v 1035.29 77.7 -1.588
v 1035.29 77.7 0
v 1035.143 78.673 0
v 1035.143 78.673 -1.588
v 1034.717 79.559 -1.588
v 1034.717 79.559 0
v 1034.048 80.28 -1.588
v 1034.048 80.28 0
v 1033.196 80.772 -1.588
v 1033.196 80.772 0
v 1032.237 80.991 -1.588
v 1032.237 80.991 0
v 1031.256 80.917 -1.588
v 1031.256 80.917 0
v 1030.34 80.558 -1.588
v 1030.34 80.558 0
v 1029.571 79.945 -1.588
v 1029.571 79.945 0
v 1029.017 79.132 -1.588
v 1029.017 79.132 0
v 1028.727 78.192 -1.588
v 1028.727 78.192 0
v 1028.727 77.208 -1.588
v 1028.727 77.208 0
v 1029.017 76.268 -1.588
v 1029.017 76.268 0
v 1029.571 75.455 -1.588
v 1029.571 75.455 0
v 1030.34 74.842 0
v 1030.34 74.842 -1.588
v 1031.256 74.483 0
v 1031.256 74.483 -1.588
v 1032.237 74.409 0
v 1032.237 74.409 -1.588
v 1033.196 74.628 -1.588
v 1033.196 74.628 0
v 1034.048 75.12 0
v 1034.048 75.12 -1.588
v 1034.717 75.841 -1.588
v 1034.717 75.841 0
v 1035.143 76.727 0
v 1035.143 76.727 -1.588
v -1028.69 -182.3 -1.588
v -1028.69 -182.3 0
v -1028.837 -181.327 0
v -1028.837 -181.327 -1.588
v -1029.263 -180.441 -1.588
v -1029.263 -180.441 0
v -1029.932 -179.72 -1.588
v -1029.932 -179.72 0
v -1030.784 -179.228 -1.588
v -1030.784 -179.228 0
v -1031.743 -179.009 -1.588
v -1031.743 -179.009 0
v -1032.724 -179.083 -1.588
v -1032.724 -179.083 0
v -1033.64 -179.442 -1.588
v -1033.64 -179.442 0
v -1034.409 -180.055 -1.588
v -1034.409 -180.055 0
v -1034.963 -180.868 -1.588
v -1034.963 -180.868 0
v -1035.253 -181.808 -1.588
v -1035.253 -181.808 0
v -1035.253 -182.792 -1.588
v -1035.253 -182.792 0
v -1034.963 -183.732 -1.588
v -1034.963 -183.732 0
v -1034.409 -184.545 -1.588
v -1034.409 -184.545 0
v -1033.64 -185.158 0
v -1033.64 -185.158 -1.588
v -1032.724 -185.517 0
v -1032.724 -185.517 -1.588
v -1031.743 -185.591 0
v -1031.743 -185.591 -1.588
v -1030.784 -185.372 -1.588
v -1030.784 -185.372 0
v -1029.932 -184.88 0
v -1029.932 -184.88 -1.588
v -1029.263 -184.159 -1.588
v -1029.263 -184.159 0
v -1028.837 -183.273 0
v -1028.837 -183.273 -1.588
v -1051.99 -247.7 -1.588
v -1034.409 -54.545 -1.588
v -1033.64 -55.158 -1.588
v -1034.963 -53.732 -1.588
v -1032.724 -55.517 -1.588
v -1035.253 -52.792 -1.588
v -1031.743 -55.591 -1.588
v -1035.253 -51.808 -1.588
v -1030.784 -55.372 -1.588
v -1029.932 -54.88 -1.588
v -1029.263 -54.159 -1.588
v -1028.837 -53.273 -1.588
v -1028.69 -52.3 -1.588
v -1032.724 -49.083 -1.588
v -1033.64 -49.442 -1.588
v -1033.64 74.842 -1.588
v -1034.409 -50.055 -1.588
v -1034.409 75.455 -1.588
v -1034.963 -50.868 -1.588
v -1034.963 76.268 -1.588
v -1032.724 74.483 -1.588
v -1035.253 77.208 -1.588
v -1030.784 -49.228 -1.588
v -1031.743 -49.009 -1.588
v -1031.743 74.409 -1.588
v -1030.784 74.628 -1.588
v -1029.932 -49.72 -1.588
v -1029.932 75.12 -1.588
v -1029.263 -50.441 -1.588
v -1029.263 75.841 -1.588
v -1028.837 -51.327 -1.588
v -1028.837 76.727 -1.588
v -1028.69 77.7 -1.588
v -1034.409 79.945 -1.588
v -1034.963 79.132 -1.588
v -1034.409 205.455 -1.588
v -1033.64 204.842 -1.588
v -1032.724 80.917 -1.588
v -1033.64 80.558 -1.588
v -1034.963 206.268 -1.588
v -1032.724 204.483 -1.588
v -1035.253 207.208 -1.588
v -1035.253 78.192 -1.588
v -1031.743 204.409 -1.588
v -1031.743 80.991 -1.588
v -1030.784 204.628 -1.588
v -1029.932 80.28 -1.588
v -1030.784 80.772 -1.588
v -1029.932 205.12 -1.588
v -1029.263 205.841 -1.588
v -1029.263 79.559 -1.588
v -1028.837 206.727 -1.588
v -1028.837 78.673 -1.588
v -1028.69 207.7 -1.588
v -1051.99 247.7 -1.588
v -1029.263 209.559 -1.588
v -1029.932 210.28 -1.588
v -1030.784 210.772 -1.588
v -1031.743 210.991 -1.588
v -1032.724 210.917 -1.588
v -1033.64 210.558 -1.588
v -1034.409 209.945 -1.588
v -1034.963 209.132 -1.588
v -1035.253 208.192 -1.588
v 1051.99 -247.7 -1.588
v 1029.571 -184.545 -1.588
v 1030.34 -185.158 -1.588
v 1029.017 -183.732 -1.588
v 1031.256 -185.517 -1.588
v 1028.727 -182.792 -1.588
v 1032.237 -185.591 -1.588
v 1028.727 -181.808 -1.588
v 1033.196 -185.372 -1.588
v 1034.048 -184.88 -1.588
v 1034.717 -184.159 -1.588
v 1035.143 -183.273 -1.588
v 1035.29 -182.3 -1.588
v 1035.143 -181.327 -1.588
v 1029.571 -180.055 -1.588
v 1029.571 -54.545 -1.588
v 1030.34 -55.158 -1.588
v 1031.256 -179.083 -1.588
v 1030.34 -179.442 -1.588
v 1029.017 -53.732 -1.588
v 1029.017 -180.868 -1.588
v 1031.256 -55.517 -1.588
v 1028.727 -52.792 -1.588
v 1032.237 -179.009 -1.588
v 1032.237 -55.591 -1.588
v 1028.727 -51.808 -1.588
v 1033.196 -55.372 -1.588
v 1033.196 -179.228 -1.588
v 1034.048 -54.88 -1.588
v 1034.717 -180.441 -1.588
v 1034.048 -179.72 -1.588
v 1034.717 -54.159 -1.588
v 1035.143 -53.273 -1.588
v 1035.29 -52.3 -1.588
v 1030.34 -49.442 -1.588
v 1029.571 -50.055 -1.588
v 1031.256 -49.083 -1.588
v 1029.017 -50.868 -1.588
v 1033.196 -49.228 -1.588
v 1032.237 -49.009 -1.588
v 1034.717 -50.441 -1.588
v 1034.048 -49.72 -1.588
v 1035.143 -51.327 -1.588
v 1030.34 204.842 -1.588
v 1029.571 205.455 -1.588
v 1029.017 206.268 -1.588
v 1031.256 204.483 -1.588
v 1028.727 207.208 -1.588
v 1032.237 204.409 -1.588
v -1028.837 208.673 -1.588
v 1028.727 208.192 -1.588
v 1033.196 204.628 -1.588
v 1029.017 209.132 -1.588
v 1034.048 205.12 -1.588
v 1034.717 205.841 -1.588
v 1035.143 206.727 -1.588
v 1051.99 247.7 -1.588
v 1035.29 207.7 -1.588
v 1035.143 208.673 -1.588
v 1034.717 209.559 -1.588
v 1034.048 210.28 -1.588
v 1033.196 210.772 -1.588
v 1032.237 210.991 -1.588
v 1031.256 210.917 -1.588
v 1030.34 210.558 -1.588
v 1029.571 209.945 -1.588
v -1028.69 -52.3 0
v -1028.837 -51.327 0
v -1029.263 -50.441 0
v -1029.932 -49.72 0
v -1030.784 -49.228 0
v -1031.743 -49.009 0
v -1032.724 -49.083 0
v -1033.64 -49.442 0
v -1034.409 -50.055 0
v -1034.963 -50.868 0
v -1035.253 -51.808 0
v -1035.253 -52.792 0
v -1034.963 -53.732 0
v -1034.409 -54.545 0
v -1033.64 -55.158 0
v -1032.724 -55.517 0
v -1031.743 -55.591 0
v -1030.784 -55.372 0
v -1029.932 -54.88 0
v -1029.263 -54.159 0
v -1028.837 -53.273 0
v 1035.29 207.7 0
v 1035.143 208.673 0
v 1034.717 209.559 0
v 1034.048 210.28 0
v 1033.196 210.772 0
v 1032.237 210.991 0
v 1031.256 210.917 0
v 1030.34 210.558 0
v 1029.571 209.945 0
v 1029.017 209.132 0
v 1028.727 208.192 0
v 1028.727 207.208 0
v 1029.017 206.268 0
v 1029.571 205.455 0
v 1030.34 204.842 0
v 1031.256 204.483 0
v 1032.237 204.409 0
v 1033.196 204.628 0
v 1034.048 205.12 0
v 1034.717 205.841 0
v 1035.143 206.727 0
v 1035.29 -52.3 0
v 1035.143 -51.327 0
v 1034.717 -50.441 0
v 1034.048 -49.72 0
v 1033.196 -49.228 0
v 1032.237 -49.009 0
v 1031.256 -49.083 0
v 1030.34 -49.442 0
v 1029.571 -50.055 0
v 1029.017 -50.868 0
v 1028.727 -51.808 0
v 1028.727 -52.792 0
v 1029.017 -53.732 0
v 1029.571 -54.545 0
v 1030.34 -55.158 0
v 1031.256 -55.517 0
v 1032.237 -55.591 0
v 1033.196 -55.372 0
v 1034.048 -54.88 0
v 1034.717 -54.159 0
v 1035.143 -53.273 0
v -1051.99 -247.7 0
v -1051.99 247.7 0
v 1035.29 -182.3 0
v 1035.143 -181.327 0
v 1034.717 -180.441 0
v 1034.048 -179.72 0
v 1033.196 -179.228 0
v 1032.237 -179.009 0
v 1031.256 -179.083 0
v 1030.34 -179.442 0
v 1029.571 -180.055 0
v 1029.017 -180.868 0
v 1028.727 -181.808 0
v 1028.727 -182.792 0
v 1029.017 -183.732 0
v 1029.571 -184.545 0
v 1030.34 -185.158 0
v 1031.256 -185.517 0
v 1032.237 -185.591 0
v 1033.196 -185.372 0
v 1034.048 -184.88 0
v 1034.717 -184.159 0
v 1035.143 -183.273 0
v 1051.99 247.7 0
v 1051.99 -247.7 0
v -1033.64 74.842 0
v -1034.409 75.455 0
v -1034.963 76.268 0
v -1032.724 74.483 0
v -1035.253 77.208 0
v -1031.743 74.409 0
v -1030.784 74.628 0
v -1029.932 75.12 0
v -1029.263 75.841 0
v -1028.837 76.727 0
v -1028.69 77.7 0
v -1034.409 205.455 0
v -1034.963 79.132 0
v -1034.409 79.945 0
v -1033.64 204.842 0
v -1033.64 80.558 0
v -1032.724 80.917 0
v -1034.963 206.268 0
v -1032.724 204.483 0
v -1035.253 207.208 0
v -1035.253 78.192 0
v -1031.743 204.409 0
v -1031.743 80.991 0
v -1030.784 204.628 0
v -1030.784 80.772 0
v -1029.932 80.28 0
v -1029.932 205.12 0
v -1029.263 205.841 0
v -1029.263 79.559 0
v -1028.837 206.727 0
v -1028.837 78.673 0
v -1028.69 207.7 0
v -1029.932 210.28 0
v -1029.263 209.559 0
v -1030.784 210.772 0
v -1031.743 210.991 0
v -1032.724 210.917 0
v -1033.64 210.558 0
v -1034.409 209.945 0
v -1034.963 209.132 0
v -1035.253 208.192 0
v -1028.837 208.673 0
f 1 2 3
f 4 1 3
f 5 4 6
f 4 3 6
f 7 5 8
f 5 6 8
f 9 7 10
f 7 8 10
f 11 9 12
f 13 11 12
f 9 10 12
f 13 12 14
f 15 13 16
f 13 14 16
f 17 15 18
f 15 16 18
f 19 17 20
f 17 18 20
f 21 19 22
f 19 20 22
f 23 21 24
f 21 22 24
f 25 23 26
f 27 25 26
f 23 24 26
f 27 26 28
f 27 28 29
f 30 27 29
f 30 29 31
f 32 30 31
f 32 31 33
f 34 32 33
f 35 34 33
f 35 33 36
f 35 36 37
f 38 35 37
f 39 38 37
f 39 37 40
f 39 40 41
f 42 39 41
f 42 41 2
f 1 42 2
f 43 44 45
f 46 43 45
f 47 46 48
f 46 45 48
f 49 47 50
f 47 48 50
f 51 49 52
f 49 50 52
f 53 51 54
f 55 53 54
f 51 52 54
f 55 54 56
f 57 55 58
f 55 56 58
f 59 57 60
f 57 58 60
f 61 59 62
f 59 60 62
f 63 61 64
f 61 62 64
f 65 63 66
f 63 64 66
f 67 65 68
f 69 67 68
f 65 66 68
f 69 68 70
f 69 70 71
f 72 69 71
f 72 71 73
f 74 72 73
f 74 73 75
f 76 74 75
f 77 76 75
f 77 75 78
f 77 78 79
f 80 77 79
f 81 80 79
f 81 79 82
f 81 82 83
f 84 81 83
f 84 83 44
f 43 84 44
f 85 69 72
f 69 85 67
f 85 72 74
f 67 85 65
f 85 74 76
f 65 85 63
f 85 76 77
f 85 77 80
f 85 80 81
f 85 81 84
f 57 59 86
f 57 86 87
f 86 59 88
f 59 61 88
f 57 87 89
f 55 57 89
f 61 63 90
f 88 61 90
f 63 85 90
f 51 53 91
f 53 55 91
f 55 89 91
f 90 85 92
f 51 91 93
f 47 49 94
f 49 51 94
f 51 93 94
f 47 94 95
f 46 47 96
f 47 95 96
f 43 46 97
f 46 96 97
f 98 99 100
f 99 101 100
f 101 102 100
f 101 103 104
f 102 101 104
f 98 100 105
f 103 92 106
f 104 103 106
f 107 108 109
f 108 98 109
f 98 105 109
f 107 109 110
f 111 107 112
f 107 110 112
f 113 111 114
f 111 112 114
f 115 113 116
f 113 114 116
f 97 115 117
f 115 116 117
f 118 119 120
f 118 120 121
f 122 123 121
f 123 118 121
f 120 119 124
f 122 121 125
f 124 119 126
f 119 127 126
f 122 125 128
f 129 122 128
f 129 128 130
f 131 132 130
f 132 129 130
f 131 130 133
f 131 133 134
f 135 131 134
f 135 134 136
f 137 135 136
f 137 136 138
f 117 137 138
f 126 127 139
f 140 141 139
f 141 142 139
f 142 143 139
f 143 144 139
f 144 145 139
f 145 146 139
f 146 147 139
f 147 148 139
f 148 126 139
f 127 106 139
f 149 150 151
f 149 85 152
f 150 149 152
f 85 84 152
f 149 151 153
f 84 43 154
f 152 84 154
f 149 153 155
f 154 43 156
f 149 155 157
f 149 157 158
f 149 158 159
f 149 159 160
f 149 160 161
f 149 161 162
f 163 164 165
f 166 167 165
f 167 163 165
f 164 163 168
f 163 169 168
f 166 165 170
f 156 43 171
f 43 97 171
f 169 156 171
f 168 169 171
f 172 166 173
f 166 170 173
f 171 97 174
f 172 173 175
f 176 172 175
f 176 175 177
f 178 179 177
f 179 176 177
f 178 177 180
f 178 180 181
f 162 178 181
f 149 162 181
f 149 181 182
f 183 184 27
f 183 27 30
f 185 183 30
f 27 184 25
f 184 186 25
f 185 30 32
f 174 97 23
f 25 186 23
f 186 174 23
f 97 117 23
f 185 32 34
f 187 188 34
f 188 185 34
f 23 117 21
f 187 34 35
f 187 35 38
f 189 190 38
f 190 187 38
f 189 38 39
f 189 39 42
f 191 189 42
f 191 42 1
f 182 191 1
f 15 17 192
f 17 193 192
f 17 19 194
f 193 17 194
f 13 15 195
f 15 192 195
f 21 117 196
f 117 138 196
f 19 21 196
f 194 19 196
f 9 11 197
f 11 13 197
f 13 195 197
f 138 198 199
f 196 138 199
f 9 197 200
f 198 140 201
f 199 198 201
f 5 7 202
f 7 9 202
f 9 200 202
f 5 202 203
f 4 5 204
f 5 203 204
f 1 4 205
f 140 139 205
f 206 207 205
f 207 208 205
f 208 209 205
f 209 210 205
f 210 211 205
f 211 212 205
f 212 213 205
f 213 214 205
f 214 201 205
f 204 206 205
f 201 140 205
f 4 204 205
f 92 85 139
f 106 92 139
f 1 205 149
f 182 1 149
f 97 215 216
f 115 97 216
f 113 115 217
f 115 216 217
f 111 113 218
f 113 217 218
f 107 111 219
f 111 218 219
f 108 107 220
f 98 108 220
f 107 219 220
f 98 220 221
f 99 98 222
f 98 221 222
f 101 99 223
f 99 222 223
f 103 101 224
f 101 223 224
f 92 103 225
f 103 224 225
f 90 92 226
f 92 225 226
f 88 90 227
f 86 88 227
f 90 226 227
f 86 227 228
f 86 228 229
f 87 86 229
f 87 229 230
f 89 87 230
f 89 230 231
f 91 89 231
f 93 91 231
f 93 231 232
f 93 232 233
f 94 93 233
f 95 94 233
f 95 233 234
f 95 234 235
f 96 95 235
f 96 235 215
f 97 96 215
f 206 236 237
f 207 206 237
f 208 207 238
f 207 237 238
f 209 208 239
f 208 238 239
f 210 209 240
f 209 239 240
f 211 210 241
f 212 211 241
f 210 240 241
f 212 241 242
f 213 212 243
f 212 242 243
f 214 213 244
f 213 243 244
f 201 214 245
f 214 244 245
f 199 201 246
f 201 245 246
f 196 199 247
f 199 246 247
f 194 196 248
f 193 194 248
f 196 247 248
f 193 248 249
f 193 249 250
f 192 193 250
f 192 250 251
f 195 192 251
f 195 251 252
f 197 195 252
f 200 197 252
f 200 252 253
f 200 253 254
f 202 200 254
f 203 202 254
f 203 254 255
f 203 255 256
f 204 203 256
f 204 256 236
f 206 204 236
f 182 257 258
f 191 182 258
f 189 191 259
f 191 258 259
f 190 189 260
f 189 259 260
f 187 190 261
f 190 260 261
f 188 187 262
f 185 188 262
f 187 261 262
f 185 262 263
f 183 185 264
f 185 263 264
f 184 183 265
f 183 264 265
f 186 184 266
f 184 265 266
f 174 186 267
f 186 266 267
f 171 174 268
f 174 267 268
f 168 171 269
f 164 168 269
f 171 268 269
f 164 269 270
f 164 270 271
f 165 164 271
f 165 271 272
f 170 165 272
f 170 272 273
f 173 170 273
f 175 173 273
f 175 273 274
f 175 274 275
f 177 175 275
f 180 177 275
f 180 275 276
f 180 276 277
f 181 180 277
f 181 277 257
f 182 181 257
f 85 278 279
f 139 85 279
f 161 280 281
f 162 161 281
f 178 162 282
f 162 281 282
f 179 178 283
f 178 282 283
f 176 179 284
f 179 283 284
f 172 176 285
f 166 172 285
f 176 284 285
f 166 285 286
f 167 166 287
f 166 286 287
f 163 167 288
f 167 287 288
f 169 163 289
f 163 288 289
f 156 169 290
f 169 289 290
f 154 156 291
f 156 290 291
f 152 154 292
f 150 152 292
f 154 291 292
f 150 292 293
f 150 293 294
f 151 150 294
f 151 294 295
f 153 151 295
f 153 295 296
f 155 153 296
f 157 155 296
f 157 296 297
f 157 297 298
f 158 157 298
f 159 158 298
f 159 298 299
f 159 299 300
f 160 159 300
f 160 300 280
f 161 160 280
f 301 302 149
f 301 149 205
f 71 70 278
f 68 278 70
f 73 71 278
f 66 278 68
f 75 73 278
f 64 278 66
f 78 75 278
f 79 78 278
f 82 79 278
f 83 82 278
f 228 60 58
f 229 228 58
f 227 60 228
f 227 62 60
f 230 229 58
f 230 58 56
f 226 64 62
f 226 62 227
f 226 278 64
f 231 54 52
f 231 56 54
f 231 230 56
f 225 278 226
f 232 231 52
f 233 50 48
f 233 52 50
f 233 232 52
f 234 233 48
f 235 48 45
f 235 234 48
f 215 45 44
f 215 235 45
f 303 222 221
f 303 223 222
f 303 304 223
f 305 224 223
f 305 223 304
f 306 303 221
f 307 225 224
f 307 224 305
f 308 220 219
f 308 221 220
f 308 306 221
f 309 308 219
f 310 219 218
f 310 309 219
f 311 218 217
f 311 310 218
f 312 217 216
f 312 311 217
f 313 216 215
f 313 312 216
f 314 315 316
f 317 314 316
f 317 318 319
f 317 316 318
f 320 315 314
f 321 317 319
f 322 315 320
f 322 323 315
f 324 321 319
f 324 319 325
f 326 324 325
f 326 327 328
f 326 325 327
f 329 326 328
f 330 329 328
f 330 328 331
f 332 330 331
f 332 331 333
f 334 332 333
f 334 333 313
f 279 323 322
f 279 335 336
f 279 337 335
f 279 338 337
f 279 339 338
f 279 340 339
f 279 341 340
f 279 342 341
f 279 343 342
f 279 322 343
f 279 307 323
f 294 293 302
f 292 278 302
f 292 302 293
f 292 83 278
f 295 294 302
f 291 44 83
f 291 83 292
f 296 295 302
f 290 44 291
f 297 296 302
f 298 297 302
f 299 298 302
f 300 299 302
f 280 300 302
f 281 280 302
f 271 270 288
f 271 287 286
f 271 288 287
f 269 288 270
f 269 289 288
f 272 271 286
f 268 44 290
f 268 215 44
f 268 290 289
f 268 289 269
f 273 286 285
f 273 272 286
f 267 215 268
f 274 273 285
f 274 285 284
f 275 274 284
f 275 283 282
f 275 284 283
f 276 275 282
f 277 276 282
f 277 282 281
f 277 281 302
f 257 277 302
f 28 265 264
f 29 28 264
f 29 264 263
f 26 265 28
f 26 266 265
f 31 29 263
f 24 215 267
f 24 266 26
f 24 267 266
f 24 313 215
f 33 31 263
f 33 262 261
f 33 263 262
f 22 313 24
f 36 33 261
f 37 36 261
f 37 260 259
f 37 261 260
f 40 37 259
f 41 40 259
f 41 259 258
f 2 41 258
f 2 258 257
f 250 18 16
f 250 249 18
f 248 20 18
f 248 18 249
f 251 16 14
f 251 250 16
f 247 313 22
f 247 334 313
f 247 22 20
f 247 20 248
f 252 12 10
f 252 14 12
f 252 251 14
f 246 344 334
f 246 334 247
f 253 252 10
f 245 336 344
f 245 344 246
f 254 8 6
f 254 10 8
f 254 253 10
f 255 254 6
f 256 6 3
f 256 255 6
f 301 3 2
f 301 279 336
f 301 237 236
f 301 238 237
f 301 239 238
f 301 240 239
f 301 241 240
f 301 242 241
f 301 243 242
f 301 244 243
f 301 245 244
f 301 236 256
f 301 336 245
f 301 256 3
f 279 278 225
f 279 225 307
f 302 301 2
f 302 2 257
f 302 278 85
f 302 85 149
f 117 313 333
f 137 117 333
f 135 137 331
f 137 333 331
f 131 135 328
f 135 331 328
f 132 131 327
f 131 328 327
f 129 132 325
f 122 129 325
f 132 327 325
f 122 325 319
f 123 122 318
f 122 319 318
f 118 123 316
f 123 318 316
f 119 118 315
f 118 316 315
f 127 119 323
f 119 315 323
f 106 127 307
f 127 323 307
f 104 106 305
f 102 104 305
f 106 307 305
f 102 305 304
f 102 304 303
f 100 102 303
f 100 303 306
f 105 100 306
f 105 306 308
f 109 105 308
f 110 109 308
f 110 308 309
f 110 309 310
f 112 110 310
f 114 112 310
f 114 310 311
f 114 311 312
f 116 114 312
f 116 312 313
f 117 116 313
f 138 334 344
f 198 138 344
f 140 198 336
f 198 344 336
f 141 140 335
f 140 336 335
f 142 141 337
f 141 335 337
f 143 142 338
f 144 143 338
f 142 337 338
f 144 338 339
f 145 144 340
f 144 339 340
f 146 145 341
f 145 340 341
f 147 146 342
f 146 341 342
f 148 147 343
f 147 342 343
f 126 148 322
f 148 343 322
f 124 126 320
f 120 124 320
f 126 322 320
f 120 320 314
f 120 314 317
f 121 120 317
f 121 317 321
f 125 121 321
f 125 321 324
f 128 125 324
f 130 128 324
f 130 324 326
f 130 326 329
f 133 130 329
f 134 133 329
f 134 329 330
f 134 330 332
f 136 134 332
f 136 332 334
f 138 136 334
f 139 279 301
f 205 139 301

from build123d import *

# Parameters (mm, degrees)
CROQUIS1_W                   = 2103.98
CROQUIS1_H                   = 495.4
BRIDA_BASE1_DEPTH            = 1.5875
TALADRO_DE_MARGEN_PARA_M61_D = 6.6


# Sheet-metal steps are written as plain solids
with BuildPart() as part:
    # Croquis1 → Brida base1 (new body)
    with BuildSketch(Plane.XY):
        Rectangle(CROQUIS1_W, CROQUIS1_H)
    extrude(amount=-BRIDA_BASE1_DEPTH)

    # Taladro de margen para M61 (through all)
    with Locations(Plane(origin=(0, 0, -1.5875), x_dir=(-1, 0, 0), z_dir=(0, 0, -1))):
        with Locations((-1031.99, 207.7), (-1031.99, 77.7), (-1031.99, -52.3), (-1031.99, -182.3), (1031.99, -182.3), (1031.99, -52.3), (1031.99, 77.7), (1031.99, 207.7)):
            Hole(TALADRO_DE_MARGEN_PARA_M61_D / 2)


solid = part.part
